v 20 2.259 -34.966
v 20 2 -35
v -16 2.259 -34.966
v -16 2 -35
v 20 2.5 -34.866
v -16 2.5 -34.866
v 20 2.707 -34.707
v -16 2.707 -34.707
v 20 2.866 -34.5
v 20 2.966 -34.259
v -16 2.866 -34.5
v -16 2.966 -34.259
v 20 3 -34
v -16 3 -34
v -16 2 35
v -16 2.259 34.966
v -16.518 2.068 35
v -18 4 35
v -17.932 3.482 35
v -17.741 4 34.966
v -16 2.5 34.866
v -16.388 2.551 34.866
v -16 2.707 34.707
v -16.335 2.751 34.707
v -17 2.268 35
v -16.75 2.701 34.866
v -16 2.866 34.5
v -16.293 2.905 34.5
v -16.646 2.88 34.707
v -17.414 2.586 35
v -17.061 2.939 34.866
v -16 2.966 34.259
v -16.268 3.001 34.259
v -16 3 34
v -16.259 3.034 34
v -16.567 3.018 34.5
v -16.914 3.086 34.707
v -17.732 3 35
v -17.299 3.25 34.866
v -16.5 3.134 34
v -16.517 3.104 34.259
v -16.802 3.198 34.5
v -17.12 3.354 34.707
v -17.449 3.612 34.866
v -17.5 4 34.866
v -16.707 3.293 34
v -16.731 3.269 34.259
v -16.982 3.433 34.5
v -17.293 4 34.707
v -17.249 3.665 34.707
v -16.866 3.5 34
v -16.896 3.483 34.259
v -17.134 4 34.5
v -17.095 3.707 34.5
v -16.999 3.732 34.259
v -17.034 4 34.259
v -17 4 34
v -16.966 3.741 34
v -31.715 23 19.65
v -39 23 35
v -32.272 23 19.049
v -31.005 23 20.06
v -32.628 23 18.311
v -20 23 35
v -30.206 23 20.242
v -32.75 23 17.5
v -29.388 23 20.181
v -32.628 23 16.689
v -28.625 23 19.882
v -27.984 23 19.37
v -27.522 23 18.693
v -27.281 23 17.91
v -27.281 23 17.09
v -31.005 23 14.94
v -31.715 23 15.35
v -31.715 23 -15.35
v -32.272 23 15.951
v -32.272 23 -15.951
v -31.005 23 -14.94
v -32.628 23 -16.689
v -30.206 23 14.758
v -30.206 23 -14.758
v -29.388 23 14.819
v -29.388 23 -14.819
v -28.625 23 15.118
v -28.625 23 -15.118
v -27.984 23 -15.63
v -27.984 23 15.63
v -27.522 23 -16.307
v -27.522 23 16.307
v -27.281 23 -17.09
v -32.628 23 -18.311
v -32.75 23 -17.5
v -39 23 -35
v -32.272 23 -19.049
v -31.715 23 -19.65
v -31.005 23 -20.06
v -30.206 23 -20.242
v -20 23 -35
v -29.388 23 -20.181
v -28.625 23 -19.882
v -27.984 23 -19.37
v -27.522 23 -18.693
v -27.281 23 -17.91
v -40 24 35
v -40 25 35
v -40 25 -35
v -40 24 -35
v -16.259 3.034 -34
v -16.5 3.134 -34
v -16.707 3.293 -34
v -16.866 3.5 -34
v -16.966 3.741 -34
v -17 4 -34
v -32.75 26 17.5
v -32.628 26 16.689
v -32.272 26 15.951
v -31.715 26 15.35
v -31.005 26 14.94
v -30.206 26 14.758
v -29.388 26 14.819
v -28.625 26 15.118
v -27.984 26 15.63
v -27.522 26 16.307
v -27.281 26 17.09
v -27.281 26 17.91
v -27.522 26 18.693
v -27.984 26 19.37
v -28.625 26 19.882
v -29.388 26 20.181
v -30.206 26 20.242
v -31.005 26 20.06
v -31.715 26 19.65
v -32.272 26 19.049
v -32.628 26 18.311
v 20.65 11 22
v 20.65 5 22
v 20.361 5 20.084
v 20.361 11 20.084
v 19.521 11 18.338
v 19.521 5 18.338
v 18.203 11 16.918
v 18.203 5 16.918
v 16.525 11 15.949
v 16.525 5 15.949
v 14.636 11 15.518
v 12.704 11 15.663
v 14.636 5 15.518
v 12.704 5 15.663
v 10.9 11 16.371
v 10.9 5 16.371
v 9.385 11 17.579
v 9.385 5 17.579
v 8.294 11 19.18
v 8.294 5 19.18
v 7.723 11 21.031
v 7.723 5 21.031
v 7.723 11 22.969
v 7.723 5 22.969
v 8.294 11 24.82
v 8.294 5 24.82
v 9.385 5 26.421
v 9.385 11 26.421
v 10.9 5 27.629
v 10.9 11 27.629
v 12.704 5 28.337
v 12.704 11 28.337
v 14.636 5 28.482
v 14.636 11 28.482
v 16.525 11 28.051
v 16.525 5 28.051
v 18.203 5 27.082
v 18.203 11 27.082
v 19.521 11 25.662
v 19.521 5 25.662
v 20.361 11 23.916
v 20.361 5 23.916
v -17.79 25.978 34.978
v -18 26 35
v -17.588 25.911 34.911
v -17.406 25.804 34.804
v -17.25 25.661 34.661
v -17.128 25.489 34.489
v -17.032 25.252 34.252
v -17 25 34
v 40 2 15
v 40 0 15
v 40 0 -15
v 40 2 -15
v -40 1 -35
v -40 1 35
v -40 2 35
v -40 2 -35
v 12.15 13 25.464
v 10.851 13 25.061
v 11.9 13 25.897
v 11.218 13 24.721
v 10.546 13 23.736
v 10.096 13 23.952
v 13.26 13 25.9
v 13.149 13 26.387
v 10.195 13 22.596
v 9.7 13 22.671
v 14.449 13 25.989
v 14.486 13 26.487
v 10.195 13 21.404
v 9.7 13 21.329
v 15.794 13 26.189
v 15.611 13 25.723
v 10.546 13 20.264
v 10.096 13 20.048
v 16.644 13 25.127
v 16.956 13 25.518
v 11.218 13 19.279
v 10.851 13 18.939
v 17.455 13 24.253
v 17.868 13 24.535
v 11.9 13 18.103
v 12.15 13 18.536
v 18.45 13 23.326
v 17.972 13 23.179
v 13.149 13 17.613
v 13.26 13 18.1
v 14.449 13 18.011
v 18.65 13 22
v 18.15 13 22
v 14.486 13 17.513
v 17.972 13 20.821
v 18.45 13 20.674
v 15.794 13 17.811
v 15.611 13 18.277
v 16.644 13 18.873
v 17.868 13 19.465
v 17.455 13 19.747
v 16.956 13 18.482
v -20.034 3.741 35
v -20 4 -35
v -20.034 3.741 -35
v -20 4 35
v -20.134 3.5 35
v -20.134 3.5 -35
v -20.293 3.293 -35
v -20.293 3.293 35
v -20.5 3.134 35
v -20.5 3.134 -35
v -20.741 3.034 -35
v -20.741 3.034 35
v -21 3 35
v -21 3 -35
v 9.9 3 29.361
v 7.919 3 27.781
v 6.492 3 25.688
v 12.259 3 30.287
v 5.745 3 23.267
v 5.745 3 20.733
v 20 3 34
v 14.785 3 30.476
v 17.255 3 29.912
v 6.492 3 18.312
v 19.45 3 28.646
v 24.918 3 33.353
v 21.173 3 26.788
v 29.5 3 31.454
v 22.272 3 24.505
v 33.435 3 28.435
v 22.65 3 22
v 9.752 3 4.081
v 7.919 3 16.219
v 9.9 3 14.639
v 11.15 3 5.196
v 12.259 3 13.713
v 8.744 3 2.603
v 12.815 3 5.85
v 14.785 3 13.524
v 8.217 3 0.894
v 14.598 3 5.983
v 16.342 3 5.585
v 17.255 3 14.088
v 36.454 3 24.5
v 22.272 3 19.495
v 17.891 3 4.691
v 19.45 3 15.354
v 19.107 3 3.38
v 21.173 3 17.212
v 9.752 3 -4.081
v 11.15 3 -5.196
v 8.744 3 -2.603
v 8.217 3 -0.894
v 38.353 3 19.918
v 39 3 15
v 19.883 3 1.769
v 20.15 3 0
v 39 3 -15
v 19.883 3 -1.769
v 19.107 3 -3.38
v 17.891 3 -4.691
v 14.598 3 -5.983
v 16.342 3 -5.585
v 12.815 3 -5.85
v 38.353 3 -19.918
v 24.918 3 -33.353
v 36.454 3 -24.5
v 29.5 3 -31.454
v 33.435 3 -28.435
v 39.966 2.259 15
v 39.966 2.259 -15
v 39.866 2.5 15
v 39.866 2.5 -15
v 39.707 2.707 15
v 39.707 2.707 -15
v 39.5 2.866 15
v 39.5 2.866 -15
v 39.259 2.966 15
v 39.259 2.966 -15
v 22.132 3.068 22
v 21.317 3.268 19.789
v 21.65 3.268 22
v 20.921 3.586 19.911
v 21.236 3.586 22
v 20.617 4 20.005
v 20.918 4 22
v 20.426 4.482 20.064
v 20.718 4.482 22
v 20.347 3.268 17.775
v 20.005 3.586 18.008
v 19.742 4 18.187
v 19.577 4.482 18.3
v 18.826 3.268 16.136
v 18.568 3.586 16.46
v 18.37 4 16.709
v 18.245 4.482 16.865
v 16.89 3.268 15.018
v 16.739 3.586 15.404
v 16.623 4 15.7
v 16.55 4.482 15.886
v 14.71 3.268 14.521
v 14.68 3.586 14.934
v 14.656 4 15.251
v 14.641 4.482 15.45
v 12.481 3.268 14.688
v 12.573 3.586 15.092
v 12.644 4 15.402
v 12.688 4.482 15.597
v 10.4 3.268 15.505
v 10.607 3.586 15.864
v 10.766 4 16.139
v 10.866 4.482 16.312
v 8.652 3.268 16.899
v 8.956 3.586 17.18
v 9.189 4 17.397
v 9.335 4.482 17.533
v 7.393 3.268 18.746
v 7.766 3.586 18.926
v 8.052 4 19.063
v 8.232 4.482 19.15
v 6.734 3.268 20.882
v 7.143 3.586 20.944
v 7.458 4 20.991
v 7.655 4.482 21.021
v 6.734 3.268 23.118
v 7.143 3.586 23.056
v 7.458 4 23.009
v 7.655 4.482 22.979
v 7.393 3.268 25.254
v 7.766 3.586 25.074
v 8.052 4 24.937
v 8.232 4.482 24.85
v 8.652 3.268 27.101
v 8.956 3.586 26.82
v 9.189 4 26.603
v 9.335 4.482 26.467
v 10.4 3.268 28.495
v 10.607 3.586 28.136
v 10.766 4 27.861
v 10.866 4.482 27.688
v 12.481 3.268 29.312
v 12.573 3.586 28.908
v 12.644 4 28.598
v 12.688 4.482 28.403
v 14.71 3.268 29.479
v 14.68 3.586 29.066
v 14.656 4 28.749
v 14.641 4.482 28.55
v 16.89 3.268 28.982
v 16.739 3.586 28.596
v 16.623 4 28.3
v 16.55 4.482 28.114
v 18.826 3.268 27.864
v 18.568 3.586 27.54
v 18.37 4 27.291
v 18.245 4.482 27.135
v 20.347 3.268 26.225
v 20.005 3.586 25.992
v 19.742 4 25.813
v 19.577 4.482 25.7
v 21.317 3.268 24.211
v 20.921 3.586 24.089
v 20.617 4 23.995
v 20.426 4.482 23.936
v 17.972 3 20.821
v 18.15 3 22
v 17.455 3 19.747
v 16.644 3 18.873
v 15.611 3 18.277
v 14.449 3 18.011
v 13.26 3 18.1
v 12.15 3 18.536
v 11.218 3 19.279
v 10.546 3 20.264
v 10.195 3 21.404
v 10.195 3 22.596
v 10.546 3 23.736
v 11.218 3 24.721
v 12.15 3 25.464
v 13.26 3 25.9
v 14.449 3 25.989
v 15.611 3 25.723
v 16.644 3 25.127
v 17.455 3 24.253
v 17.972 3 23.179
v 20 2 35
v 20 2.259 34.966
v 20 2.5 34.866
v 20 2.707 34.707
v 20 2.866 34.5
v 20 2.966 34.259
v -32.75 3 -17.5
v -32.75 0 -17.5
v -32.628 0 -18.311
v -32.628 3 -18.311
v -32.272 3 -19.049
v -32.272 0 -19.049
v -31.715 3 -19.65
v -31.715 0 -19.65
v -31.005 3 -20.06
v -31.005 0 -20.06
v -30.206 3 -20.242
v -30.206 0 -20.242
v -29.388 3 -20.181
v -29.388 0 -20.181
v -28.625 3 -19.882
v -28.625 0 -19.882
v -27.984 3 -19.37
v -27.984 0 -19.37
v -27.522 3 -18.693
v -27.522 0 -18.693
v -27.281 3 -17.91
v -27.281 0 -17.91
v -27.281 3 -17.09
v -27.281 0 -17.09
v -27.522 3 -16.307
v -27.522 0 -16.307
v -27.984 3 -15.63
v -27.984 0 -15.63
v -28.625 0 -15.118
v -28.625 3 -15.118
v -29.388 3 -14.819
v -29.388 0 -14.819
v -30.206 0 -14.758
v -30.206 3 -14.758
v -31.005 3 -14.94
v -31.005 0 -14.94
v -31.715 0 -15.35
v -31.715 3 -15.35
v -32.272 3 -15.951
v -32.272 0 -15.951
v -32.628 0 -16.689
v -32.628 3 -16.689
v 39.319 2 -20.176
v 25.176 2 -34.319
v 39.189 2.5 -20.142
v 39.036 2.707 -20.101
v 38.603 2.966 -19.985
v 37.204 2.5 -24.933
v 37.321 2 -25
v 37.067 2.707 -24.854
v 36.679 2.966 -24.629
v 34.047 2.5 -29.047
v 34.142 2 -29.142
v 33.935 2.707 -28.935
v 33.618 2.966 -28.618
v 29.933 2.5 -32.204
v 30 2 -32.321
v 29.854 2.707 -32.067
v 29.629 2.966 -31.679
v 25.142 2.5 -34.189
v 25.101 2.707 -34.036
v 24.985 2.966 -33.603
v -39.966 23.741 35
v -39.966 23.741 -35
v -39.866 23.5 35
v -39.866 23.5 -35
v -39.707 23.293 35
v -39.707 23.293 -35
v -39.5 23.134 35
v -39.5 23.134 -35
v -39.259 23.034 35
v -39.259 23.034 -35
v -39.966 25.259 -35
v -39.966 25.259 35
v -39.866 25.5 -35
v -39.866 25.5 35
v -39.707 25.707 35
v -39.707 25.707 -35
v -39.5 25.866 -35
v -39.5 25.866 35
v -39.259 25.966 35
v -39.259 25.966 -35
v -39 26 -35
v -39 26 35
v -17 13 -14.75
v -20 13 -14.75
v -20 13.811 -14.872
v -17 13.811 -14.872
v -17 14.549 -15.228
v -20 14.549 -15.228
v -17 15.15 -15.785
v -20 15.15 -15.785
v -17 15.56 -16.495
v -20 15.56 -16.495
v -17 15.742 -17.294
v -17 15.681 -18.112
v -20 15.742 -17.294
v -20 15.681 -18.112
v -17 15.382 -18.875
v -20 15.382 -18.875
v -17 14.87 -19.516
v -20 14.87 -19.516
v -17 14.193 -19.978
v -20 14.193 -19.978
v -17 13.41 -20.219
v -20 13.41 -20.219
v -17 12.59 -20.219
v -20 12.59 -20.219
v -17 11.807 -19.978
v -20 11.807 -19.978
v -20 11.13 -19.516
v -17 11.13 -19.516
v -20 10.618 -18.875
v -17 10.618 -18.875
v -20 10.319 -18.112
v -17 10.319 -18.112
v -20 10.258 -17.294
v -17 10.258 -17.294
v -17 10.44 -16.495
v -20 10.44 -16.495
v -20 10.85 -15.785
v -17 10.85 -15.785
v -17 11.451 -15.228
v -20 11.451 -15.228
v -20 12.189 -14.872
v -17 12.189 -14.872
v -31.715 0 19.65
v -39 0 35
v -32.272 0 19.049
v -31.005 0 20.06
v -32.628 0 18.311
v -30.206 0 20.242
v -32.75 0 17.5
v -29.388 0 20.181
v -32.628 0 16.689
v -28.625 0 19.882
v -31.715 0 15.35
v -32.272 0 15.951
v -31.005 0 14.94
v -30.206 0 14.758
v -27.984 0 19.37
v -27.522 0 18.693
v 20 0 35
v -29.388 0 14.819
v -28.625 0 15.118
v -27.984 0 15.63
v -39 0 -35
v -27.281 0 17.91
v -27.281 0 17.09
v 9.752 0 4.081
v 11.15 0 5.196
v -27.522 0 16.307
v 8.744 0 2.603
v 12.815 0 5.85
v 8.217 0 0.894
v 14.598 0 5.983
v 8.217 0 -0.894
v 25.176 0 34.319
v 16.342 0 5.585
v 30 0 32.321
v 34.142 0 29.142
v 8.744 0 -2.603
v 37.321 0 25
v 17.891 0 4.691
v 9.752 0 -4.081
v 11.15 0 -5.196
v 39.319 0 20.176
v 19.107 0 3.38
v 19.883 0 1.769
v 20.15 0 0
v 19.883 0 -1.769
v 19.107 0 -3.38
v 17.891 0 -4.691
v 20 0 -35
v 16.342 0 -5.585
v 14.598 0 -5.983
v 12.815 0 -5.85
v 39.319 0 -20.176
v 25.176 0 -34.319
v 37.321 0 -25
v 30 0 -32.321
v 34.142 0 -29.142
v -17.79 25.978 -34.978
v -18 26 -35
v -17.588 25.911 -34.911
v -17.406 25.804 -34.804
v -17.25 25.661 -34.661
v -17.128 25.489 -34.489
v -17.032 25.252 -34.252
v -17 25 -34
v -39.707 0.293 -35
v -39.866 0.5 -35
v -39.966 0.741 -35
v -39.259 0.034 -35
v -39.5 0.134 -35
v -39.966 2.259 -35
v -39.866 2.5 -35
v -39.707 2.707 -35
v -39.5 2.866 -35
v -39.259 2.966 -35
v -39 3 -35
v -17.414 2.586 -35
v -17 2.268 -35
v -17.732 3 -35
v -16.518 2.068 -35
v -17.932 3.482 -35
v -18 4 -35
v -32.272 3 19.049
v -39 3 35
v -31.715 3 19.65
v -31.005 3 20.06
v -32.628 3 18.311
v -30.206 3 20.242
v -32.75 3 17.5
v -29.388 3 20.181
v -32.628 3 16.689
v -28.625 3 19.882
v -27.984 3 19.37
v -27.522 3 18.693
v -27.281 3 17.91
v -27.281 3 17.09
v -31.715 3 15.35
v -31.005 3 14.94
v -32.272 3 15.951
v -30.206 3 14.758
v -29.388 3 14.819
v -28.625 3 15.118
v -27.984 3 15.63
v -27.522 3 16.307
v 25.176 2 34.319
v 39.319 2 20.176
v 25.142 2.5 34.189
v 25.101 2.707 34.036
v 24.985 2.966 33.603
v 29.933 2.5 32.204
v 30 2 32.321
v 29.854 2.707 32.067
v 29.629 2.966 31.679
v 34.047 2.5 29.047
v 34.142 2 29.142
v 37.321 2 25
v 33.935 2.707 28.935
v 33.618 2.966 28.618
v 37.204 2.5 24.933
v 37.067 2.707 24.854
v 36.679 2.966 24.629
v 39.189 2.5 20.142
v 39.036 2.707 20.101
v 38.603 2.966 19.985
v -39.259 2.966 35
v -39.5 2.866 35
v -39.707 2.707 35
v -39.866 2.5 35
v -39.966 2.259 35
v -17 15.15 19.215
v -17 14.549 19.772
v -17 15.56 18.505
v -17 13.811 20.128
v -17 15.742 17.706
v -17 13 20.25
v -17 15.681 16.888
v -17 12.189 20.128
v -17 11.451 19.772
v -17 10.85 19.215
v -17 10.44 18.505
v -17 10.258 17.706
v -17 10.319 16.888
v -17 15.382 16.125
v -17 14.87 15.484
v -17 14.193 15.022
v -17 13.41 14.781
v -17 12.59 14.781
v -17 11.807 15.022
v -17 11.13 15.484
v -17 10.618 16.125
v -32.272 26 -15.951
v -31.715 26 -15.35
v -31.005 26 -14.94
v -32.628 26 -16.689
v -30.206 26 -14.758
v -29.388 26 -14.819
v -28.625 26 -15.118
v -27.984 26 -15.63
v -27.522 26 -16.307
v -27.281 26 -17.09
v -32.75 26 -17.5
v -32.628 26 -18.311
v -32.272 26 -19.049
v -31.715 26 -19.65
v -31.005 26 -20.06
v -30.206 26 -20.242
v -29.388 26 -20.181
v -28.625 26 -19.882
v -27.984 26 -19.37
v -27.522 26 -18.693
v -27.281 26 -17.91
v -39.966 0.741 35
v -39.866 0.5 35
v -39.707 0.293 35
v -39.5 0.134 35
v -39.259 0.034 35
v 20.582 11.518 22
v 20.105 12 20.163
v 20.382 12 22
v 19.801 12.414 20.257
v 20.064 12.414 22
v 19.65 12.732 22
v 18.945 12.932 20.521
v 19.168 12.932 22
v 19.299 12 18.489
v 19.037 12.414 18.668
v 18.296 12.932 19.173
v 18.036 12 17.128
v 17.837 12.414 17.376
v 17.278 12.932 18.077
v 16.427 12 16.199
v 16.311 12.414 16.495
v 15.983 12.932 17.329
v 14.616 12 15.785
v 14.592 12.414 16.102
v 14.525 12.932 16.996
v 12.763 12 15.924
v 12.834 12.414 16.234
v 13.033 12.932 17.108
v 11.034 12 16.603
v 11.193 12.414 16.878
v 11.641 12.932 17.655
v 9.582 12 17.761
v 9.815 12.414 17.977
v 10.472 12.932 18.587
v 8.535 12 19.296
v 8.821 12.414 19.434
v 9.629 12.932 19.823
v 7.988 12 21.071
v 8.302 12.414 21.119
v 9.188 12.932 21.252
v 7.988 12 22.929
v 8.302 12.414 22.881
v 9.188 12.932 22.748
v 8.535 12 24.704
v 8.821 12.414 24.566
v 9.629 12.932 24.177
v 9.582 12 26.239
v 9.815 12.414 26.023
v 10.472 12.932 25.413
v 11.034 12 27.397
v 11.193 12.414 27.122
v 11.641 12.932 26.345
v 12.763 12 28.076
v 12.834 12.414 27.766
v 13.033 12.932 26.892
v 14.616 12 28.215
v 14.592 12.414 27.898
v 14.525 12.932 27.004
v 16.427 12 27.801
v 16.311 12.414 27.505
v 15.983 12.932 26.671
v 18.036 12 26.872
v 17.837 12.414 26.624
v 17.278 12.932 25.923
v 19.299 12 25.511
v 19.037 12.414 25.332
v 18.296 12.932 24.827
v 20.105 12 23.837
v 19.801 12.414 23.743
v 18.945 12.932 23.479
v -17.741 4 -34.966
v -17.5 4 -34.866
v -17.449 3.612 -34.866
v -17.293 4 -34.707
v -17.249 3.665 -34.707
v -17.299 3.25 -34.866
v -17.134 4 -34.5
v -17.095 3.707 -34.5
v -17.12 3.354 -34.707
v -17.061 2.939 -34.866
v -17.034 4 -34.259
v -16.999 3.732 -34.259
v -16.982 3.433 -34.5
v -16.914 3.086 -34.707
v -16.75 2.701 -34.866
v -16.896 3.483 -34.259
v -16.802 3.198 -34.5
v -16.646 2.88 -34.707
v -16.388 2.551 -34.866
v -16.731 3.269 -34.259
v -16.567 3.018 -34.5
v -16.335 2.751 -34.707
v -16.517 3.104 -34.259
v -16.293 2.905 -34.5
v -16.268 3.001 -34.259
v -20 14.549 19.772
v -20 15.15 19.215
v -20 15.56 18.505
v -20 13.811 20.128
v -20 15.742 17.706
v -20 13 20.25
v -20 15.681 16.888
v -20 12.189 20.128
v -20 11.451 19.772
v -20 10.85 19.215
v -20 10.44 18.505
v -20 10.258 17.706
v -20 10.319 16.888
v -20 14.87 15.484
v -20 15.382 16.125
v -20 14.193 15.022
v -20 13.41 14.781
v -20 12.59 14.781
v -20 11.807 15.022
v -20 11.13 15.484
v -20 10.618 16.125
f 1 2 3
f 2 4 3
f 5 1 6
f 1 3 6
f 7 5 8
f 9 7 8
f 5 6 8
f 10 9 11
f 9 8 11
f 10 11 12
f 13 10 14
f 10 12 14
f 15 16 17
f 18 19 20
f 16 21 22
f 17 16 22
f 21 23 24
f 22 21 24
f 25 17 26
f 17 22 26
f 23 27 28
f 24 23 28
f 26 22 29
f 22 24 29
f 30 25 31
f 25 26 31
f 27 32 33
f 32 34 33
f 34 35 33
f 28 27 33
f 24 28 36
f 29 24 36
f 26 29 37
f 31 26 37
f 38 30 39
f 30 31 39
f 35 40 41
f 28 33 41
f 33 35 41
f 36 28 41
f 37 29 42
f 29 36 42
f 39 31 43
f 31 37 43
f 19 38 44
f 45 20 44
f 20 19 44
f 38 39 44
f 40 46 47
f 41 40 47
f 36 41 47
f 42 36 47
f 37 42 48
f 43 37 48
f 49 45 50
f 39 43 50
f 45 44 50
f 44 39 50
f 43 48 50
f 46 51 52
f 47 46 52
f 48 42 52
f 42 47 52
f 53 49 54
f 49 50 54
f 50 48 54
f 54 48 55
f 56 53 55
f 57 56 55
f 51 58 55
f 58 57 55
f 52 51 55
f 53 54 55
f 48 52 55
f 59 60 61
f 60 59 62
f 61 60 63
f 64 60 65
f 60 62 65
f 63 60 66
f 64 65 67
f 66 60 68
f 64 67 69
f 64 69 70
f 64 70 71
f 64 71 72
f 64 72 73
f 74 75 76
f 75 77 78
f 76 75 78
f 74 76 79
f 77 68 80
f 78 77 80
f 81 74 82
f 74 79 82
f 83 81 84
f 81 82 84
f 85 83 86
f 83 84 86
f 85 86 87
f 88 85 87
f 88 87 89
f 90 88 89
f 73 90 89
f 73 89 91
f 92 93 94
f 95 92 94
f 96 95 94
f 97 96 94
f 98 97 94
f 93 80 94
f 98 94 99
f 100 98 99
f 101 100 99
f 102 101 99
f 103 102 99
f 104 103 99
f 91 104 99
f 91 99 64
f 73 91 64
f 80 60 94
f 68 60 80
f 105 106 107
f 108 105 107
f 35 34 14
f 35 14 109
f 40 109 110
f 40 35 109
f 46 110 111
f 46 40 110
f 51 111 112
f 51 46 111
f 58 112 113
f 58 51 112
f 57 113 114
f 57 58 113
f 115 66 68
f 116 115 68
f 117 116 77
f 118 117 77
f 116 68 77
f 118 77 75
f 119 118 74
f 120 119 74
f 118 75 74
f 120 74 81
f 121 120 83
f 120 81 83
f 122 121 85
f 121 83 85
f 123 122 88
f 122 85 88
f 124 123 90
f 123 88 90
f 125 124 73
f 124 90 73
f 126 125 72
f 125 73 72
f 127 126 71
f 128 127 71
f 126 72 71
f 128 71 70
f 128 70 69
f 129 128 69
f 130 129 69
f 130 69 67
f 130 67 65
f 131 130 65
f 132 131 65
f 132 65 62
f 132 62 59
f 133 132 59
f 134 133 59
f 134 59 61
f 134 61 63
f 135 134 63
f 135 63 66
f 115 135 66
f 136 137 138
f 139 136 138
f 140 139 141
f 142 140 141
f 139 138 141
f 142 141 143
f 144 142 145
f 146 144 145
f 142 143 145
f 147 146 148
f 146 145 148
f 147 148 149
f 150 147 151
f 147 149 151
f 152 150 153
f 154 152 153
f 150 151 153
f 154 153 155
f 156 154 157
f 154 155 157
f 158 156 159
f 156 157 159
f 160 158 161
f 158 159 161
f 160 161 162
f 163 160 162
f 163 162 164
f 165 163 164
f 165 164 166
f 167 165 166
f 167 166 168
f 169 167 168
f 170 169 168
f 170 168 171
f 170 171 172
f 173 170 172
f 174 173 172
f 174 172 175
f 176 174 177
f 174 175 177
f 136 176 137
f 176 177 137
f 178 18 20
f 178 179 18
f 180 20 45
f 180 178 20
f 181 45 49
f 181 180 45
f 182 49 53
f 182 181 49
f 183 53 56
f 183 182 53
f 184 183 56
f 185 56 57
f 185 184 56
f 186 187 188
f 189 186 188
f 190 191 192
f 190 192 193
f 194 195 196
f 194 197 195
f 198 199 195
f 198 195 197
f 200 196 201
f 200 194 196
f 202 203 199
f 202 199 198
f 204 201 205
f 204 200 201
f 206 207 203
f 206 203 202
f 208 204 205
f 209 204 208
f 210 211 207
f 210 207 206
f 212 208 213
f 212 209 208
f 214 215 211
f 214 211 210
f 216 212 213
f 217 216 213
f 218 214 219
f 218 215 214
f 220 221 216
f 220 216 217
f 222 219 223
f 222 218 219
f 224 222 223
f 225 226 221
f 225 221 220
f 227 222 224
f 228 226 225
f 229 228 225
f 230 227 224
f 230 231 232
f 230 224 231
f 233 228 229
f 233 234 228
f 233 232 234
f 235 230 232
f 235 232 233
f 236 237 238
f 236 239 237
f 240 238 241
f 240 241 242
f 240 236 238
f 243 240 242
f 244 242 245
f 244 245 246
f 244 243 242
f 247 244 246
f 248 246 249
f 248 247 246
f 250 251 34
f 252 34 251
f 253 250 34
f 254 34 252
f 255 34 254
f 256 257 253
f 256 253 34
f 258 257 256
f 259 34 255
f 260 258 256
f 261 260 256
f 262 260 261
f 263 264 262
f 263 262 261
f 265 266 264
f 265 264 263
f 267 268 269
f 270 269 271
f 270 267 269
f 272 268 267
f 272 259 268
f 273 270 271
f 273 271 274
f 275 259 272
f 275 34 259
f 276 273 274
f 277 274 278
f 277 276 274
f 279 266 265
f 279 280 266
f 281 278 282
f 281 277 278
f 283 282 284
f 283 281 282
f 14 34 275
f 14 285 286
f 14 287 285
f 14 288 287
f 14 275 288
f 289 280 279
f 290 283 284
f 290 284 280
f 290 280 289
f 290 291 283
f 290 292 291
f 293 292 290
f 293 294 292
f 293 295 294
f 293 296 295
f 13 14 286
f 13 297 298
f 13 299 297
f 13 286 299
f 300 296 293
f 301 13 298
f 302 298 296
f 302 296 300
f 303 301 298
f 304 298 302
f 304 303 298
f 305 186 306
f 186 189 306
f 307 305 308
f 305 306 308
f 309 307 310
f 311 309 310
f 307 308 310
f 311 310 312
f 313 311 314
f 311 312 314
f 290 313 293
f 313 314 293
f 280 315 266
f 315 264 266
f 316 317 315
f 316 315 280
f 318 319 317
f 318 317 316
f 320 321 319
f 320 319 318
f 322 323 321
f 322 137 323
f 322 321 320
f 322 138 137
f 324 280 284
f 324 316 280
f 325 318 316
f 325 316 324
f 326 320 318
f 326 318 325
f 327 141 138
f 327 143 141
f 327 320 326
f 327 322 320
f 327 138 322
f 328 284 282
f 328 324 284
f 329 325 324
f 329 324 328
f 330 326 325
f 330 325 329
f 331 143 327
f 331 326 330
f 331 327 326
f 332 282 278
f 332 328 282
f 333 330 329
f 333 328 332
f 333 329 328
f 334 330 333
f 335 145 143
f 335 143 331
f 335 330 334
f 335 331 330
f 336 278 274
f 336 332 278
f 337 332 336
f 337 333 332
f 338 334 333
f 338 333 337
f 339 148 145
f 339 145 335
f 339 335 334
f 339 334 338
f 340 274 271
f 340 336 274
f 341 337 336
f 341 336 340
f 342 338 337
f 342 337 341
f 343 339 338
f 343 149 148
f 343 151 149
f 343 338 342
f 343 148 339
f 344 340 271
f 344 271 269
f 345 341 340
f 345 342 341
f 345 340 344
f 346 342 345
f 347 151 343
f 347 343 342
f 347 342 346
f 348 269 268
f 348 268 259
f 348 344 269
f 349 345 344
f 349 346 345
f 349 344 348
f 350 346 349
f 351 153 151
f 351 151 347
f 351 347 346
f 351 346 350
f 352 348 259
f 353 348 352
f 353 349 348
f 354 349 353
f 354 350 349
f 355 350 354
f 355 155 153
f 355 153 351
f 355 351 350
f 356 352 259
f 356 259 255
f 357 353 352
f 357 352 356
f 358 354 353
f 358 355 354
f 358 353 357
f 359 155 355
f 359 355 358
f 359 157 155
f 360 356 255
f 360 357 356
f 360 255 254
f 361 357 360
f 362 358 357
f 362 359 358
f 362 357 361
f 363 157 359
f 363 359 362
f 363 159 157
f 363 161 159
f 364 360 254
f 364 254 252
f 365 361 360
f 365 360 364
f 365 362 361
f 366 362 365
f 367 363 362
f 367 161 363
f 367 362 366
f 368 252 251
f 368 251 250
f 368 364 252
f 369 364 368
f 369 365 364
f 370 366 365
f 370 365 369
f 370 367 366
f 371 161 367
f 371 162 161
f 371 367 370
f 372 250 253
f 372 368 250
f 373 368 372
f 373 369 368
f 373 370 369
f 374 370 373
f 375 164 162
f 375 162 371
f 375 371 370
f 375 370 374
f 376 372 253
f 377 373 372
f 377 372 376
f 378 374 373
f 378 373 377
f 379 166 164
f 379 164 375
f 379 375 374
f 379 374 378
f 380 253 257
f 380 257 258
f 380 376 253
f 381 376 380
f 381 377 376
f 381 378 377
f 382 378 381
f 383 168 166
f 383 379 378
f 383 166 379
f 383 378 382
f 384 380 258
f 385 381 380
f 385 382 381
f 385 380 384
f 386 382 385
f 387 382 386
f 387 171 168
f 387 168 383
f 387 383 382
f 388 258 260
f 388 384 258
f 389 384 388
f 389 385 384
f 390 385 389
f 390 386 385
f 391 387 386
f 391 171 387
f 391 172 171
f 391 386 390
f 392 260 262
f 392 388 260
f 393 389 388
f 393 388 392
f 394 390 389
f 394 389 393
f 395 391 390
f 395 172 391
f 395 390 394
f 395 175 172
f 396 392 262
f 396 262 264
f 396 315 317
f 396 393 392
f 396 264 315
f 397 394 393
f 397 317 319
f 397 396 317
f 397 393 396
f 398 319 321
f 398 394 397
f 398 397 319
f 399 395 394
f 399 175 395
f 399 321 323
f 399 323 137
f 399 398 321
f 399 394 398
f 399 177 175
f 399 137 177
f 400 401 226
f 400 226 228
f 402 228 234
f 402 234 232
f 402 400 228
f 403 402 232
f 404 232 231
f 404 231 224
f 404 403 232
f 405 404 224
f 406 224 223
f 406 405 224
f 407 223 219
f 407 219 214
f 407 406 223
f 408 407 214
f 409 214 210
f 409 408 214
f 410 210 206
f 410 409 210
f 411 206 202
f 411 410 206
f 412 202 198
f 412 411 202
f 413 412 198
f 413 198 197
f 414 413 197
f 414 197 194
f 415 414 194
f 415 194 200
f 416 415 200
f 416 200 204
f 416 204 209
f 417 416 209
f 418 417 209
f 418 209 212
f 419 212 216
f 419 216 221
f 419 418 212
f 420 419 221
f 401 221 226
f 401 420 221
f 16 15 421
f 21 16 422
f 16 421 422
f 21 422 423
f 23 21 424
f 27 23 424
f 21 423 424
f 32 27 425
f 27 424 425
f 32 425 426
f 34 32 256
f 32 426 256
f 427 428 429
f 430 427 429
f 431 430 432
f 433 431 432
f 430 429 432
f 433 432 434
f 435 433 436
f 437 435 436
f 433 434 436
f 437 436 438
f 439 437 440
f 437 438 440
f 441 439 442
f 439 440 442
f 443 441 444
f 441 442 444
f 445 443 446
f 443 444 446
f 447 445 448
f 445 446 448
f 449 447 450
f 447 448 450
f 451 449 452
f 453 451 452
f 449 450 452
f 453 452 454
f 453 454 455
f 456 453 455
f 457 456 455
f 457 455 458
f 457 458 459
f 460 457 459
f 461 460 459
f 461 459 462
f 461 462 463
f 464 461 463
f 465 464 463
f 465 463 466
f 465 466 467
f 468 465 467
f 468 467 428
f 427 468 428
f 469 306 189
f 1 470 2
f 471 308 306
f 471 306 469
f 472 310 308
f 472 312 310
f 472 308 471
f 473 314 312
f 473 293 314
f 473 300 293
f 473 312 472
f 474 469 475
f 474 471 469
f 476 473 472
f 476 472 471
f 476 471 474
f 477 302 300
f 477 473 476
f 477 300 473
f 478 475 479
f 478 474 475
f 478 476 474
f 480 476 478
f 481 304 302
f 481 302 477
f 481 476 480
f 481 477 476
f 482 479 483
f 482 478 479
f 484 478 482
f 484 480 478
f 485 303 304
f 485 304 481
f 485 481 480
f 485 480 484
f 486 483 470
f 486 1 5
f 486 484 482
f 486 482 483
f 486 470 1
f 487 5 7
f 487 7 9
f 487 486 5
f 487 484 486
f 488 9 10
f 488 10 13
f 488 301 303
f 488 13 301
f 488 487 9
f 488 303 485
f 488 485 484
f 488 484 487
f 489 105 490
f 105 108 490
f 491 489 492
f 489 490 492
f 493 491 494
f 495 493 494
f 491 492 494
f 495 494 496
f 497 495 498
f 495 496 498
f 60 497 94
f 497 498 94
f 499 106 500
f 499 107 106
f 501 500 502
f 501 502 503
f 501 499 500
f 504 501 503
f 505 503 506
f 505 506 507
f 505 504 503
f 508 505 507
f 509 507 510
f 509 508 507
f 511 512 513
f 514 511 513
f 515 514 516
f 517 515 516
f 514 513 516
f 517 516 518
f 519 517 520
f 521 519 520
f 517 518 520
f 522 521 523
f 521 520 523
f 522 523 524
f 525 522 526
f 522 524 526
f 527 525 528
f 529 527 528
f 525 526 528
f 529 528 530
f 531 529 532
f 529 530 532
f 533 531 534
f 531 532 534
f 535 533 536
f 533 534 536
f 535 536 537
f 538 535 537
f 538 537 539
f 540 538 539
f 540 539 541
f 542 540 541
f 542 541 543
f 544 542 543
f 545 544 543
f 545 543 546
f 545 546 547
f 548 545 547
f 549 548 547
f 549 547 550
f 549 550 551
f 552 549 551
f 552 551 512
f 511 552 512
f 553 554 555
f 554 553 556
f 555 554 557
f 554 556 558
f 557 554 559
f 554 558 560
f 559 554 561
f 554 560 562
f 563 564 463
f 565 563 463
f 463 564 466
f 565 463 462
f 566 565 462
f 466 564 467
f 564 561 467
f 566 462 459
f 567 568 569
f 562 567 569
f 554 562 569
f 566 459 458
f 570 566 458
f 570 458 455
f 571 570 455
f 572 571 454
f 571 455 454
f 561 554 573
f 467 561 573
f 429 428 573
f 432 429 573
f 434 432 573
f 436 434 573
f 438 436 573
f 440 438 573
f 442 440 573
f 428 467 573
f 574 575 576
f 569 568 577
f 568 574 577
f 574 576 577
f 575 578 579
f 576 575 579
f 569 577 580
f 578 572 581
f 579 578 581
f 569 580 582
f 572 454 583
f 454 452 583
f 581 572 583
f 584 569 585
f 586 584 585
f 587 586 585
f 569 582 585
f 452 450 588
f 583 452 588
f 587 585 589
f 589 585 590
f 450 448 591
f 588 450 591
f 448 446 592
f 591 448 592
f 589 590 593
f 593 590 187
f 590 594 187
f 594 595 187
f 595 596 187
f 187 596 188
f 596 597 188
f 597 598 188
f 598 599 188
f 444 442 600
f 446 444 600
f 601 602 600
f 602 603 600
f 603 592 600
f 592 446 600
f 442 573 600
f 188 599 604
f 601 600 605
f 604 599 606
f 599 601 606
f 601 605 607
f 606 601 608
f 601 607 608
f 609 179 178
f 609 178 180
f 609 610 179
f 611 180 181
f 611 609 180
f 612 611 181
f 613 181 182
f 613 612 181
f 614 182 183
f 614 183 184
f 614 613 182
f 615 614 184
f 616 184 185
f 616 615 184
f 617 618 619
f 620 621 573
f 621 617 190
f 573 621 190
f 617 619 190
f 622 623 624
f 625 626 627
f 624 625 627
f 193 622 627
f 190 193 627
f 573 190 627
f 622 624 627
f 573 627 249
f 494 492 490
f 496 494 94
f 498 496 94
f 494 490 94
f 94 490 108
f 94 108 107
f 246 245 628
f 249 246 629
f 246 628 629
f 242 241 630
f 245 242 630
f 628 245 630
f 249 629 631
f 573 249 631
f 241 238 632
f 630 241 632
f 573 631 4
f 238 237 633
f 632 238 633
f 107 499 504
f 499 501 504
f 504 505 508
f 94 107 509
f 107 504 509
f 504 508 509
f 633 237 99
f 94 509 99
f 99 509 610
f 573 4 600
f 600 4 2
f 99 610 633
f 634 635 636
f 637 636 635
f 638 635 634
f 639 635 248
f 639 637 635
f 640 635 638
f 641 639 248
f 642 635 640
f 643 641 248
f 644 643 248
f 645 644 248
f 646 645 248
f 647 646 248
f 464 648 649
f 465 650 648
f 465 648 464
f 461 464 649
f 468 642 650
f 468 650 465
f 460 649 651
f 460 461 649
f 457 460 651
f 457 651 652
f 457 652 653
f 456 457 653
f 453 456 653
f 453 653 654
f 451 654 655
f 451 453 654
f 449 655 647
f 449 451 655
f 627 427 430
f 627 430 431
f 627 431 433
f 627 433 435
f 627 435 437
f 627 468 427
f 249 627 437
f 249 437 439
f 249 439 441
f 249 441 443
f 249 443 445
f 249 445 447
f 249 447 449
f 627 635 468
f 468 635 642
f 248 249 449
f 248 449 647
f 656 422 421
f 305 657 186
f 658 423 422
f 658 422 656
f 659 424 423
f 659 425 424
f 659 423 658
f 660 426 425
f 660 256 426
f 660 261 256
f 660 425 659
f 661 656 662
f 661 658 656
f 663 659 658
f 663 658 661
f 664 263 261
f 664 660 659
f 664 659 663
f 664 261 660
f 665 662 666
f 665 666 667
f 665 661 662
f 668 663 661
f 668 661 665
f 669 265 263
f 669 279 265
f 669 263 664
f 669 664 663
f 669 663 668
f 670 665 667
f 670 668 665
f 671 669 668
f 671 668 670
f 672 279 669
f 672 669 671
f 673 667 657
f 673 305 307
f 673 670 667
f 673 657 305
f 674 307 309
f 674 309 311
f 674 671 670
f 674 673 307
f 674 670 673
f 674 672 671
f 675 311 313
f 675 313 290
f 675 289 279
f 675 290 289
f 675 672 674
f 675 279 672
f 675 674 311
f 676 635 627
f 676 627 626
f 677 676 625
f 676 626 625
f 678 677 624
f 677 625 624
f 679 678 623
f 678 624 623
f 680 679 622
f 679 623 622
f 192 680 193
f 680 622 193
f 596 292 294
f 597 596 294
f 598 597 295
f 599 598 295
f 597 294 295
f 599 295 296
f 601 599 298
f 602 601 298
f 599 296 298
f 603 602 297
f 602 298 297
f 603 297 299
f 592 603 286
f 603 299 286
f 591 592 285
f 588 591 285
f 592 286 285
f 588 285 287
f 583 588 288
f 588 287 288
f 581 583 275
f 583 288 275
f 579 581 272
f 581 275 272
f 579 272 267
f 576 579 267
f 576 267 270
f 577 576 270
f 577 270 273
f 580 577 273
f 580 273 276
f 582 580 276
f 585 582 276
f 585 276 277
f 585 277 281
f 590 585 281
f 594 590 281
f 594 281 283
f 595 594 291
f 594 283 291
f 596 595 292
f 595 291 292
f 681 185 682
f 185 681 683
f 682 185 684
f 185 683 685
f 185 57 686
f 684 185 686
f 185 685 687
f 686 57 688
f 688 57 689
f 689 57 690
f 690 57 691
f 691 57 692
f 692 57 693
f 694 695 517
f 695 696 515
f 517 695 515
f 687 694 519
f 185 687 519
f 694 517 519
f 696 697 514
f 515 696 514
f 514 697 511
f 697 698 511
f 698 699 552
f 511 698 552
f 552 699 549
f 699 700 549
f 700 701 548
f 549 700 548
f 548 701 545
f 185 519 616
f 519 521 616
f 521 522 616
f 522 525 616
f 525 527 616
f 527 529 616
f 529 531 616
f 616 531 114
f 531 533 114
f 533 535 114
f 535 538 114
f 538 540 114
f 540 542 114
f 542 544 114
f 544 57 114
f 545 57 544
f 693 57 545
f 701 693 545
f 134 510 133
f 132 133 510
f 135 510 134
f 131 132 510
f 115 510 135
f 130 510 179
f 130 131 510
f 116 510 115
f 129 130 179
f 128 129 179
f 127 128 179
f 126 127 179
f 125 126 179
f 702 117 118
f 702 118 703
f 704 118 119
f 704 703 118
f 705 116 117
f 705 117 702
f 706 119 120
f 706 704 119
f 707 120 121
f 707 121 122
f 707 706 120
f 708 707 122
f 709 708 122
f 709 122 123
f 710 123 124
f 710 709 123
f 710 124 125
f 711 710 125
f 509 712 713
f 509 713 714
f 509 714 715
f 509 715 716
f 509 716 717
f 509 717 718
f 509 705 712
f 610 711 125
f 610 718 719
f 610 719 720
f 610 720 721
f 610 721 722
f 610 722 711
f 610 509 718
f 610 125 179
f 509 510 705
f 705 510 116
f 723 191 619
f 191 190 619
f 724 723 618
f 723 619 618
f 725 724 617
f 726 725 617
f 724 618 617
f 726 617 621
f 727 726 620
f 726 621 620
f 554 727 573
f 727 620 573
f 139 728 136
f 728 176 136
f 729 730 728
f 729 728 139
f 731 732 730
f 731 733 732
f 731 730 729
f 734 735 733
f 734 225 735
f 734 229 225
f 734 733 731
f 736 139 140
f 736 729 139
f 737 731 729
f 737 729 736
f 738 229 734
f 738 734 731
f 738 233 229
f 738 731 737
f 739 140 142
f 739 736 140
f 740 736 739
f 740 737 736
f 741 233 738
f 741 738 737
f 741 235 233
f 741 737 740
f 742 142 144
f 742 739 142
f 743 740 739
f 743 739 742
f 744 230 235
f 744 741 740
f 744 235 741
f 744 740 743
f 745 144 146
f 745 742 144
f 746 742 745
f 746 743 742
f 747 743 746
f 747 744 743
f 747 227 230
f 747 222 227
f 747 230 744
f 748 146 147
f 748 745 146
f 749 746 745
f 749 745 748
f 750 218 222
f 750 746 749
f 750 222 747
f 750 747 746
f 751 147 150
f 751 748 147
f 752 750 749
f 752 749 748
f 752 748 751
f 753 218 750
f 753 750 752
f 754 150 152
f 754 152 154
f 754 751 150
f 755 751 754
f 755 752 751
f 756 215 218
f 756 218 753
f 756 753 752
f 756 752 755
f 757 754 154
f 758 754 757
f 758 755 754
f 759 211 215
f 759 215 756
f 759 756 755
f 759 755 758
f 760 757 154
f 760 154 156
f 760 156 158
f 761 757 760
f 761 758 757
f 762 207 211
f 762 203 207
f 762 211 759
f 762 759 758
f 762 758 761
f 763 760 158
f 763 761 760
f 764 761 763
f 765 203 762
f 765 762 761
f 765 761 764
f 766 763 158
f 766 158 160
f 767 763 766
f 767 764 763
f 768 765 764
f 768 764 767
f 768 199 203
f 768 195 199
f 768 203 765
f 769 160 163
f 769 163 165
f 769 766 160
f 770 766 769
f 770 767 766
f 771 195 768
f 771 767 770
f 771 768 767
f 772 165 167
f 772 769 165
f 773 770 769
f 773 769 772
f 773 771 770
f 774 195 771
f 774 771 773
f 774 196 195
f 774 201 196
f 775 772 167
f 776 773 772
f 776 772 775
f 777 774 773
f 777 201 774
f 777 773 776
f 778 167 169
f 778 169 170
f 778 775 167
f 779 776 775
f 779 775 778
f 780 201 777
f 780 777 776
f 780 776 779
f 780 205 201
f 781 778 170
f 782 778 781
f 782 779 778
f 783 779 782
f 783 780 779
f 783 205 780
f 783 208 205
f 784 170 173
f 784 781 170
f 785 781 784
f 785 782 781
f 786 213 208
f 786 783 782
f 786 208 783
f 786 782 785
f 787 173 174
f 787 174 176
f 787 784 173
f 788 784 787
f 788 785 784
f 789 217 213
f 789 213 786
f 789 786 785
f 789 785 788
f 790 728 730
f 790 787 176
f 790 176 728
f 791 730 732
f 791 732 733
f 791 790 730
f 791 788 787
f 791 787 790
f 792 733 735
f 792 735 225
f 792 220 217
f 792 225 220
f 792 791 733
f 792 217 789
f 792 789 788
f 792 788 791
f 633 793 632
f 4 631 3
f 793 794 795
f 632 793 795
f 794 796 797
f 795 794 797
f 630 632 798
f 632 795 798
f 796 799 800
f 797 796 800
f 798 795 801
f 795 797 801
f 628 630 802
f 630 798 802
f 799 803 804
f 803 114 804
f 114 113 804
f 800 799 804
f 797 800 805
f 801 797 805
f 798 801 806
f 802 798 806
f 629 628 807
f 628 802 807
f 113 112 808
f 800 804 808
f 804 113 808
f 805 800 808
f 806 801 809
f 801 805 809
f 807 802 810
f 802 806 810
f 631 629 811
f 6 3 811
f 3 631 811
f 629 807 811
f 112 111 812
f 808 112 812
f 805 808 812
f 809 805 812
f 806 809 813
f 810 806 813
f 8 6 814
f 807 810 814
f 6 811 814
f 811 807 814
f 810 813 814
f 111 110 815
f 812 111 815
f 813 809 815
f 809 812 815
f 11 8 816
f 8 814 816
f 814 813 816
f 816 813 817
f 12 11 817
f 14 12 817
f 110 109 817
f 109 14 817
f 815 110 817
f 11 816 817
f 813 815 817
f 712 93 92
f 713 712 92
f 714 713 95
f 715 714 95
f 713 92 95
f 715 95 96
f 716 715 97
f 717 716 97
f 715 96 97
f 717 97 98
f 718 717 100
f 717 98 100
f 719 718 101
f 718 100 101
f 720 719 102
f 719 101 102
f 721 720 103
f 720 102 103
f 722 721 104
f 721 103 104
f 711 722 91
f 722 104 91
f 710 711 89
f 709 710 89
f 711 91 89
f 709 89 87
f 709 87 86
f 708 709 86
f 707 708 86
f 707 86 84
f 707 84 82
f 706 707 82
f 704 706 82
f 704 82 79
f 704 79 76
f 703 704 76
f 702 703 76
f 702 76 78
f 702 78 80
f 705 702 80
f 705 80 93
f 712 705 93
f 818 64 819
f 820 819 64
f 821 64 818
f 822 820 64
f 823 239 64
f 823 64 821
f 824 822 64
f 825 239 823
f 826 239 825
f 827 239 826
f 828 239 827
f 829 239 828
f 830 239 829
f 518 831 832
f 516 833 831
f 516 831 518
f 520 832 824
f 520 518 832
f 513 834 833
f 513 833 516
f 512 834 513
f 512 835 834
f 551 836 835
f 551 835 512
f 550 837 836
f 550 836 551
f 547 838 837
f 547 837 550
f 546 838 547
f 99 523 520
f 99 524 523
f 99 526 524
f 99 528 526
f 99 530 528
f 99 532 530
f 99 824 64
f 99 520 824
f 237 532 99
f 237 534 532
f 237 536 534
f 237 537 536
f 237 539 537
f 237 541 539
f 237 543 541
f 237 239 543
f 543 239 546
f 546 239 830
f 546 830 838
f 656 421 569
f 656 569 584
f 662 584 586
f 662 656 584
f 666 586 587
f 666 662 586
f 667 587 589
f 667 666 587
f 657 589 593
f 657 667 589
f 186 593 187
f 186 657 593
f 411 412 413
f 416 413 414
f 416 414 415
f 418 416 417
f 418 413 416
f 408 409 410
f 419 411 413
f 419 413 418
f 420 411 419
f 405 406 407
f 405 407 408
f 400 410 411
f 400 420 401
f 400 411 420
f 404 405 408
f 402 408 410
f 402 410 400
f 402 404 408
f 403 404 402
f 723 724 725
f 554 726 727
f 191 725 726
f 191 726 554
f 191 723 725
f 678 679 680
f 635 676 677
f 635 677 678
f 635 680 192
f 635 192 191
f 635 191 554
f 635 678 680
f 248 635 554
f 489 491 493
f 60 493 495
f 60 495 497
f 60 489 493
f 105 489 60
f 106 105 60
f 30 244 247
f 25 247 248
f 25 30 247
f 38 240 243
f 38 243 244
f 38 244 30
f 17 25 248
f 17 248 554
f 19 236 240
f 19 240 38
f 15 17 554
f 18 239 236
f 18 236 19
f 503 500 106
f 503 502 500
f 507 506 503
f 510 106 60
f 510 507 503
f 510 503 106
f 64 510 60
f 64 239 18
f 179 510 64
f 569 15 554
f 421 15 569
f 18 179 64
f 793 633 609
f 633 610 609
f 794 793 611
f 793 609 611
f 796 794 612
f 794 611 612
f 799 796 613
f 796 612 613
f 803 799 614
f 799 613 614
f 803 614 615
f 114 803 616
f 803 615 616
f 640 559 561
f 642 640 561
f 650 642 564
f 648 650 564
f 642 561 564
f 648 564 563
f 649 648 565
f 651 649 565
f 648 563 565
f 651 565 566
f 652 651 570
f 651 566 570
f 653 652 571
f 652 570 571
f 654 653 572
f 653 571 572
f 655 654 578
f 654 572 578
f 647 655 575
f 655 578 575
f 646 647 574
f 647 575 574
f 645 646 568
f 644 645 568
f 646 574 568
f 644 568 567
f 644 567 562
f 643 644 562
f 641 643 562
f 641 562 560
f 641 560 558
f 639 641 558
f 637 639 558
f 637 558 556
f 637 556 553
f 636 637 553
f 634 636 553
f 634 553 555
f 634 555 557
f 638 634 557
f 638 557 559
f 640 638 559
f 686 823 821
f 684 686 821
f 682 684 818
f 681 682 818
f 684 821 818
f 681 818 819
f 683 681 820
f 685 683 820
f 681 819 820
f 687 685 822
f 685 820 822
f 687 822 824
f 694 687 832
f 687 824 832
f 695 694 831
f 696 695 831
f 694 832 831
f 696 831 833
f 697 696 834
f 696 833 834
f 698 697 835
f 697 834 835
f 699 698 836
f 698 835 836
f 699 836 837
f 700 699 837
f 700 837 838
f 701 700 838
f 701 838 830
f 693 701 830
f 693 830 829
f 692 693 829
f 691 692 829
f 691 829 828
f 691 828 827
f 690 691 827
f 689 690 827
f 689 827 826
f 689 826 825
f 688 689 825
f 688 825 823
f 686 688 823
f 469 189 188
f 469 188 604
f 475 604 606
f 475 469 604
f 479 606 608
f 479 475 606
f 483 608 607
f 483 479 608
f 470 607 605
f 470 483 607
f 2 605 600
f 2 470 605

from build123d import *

# Parameters (mm, degrees)
SKETCH1_W                = 20
SKETCH1_H                = 70
SKETCH1_R                = 2.5
SKETCH1_W_2              = 57
SKETCH1_W_3              = 3
BOSS_EXTRUDE1_DEPTH      = 3
SKETCH1_3_W              = 3
SKETCH1_3_H              = 70
BOSS_EXTRUDE2_DEPTH      = 26
SKETCH3_R                = 11.0045
SKETCH3_R_2              = 6
CUT_EXTRUDE2_DEPTH       = 10
FILLET1_R                = 20
BOSS_EXTRUDE4_START      = 26
SKETCH1_4_W              = 20
SKETCH1_4_H              = 70
SKETCH1_4_R              = 2.5
BOSS_EXTRUDE4_DEPTH      = 3
SKETCH4_R                = 6.5
SKETCH4_R_2              = 4
BOSS_EXTRUDE5_DEPTH      = 10
FILLET2_R                = 1
SKETCH3_4_R              = 11.0045
SKETCH3_4_R_2            = 6
BOSS_EXTRUDE7_DEPTH      = 3
FILLET3_R                = 2
M5_CLEARANCE_HOLE1_D     = 5.5
M5_CLEARANCE_HOLE1_DEPTH = 23
M5_CLEARANCE_HOLE2_D     = 5.5


with BuildPart() as part:
    # Sketch1 → Boss-Extrude1 (new body)
    with BuildSketch(Plane(origin=(0, 0, 0), x_dir=(1, 0, 0), z_dir=(0, 1, 0))):
        with Locations((-30, 0)):
            Rectangle(SKETCH1_W, SKETCH1_H)
        with Locations((-30, -17.5)):
            Circle(SKETCH1_R, mode=Mode.SUBTRACT)
        with Locations((-30, 17.5)):
            Circle(SKETCH1_R, mode=Mode.SUBTRACT)
        with Locations((11.5, 0)):
            Rectangle(SKETCH1_W_2, SKETCH1_H)
        with Locations((-18.5, 0)):
            Rectangle(SKETCH1_W_3, SKETCH1_H)
    extrude(amount=BOSS_EXTRUDE1_DEPTH)

    # Sketch1<3> → Boss-Extrude2 (add)
    with BuildSketch(Plane(origin=(0, 0, 0), x_dir=(1, 0, 0), z_dir=(0, 1, 0))):
        with Locations((-18.5, 0)):
            Rectangle(SKETCH1_3_W, SKETCH1_3_H)
    extrude(amount=BOSS_EXTRUDE2_DEPTH)

    # Sketch3 → Cut-Extrude2 (cut)
    with BuildSketch(Plane(origin=(0, 3, 0), x_dir=(1, 0, 0), z_dir=(0, 1, 0))):
        with Locations((14.15, 0)):
            Circle(SKETCH3_R)
        with Locations((14.15, 0)):
            Circle(SKETCH3_R_2)
    extrude(amount=-CUT_EXTRUDE2_DEPTH, mode=Mode.SUBTRACT)

    # Fillet1
    fillet1_edges = [part.edges().sort_by_distance(p)[0] for p in [
        (40, 1.5, -35),
        (40, 1.5, 35),
    ]]
    fillet(fillet1_edges, radius=FILLET1_R)

    # Sketch1<4> → Boss-Extrude4 (add)
    with BuildSketch(Plane(origin=(0, 0, 0), x_dir=(1, 0, 0), z_dir=(0, 1, 0)).offset(BOSS_EXTRUDE4_START)):
        with Locations((-30, 0)):
            Rectangle(SKETCH1_4_W, SKETCH1_4_H)
        with Locations((-30, -17.5)):
            Circle(SKETCH1_4_R, mode=Mode.SUBTRACT)
        with Locations((-30, 17.5)):
            Circle(SKETCH1_4_R, mode=Mode.SUBTRACT)
    extrude(amount=-BOSS_EXTRUDE4_DEPTH)

    # Sketch4 → Boss-Extrude5 (add)
    with BuildSketch(Plane(origin=(0, 3, 0), x_dir=(1, 0, 0), z_dir=(0, 1, 0))):
        with Locations((14.15, -22)):
            Circle(SKETCH4_R)
        with Locations((14.15, -22)):
            Circle(SKETCH4_R_2, mode=Mode.SUBTRACT)
    extrude(amount=BOSS_EXTRUDE5_DEPTH)

    # Fillet2
    fillet2_edges = [part.edges().sort_by_distance(p)[0] for p in [
        (1.5, 3, 35),
        (1.5, 3, -35),
        (-20, 3, 0),
        (-17, 14.5, 35),
        (-17, 3, 0),
        (-17, 26, 0),
        (-17, 14.5, -35),
        (-40, 3, 0),
        (40, 3, 0),
        (34.142135624, 3, -29.142135624),
        (34.142135624, 3, 29.142135624),
        (-40, 23, 0),
        (-40, 26, 0),
        (-40, 0, 0),
    ]]
    fillet(fillet2_edges, radius=FILLET2_R)

    # Sketch3<4> → Boss-Extrude7 (add)
    with BuildSketch(Plane(origin=(0, 3, 0), x_dir=(1, 0, 0), z_dir=(0, 1, 0))):
        with Locations((14.15, 0)):
            Circle(SKETCH3_4_R)
        with Locations((14.15, 0)):
            Circle(SKETCH3_4_R_2, mode=Mode.SUBTRACT)
    extrude(amount=-BOSS_EXTRUDE7_DEPTH)

    # Fillet3
    fillet3_edges = [part.edges().sort_by_distance(p)[0] for p in [
        (7.65, 13, 22),
        (7.65, 3, 22),
    ]]
    fillet(fillet3_edges, radius=FILLET3_R)

    # M5 Clearance Hole1
    with Locations(Plane(origin=(-17, 0, 0), x_dir=(0, 0, -1), z_dir=(1, 0, 0))):
        with Locations((-17.5, 13), (17.5, 13)):
            Hole(M5_CLEARANCE_HOLE1_D / 2, depth=M5_CLEARANCE_HOLE1_DEPTH)

    # M5 Clearance Hole2 (through all)
    with Locations(Plane(origin=(0, 26, 0), x_dir=(1, 0, 0), z_dir=(0, 1, 0))):
        with Locations((-30, -17.5), (-30, 17.5)):
            Hole(M5_CLEARANCE_HOLE2_D / 2)


solid = part.part
